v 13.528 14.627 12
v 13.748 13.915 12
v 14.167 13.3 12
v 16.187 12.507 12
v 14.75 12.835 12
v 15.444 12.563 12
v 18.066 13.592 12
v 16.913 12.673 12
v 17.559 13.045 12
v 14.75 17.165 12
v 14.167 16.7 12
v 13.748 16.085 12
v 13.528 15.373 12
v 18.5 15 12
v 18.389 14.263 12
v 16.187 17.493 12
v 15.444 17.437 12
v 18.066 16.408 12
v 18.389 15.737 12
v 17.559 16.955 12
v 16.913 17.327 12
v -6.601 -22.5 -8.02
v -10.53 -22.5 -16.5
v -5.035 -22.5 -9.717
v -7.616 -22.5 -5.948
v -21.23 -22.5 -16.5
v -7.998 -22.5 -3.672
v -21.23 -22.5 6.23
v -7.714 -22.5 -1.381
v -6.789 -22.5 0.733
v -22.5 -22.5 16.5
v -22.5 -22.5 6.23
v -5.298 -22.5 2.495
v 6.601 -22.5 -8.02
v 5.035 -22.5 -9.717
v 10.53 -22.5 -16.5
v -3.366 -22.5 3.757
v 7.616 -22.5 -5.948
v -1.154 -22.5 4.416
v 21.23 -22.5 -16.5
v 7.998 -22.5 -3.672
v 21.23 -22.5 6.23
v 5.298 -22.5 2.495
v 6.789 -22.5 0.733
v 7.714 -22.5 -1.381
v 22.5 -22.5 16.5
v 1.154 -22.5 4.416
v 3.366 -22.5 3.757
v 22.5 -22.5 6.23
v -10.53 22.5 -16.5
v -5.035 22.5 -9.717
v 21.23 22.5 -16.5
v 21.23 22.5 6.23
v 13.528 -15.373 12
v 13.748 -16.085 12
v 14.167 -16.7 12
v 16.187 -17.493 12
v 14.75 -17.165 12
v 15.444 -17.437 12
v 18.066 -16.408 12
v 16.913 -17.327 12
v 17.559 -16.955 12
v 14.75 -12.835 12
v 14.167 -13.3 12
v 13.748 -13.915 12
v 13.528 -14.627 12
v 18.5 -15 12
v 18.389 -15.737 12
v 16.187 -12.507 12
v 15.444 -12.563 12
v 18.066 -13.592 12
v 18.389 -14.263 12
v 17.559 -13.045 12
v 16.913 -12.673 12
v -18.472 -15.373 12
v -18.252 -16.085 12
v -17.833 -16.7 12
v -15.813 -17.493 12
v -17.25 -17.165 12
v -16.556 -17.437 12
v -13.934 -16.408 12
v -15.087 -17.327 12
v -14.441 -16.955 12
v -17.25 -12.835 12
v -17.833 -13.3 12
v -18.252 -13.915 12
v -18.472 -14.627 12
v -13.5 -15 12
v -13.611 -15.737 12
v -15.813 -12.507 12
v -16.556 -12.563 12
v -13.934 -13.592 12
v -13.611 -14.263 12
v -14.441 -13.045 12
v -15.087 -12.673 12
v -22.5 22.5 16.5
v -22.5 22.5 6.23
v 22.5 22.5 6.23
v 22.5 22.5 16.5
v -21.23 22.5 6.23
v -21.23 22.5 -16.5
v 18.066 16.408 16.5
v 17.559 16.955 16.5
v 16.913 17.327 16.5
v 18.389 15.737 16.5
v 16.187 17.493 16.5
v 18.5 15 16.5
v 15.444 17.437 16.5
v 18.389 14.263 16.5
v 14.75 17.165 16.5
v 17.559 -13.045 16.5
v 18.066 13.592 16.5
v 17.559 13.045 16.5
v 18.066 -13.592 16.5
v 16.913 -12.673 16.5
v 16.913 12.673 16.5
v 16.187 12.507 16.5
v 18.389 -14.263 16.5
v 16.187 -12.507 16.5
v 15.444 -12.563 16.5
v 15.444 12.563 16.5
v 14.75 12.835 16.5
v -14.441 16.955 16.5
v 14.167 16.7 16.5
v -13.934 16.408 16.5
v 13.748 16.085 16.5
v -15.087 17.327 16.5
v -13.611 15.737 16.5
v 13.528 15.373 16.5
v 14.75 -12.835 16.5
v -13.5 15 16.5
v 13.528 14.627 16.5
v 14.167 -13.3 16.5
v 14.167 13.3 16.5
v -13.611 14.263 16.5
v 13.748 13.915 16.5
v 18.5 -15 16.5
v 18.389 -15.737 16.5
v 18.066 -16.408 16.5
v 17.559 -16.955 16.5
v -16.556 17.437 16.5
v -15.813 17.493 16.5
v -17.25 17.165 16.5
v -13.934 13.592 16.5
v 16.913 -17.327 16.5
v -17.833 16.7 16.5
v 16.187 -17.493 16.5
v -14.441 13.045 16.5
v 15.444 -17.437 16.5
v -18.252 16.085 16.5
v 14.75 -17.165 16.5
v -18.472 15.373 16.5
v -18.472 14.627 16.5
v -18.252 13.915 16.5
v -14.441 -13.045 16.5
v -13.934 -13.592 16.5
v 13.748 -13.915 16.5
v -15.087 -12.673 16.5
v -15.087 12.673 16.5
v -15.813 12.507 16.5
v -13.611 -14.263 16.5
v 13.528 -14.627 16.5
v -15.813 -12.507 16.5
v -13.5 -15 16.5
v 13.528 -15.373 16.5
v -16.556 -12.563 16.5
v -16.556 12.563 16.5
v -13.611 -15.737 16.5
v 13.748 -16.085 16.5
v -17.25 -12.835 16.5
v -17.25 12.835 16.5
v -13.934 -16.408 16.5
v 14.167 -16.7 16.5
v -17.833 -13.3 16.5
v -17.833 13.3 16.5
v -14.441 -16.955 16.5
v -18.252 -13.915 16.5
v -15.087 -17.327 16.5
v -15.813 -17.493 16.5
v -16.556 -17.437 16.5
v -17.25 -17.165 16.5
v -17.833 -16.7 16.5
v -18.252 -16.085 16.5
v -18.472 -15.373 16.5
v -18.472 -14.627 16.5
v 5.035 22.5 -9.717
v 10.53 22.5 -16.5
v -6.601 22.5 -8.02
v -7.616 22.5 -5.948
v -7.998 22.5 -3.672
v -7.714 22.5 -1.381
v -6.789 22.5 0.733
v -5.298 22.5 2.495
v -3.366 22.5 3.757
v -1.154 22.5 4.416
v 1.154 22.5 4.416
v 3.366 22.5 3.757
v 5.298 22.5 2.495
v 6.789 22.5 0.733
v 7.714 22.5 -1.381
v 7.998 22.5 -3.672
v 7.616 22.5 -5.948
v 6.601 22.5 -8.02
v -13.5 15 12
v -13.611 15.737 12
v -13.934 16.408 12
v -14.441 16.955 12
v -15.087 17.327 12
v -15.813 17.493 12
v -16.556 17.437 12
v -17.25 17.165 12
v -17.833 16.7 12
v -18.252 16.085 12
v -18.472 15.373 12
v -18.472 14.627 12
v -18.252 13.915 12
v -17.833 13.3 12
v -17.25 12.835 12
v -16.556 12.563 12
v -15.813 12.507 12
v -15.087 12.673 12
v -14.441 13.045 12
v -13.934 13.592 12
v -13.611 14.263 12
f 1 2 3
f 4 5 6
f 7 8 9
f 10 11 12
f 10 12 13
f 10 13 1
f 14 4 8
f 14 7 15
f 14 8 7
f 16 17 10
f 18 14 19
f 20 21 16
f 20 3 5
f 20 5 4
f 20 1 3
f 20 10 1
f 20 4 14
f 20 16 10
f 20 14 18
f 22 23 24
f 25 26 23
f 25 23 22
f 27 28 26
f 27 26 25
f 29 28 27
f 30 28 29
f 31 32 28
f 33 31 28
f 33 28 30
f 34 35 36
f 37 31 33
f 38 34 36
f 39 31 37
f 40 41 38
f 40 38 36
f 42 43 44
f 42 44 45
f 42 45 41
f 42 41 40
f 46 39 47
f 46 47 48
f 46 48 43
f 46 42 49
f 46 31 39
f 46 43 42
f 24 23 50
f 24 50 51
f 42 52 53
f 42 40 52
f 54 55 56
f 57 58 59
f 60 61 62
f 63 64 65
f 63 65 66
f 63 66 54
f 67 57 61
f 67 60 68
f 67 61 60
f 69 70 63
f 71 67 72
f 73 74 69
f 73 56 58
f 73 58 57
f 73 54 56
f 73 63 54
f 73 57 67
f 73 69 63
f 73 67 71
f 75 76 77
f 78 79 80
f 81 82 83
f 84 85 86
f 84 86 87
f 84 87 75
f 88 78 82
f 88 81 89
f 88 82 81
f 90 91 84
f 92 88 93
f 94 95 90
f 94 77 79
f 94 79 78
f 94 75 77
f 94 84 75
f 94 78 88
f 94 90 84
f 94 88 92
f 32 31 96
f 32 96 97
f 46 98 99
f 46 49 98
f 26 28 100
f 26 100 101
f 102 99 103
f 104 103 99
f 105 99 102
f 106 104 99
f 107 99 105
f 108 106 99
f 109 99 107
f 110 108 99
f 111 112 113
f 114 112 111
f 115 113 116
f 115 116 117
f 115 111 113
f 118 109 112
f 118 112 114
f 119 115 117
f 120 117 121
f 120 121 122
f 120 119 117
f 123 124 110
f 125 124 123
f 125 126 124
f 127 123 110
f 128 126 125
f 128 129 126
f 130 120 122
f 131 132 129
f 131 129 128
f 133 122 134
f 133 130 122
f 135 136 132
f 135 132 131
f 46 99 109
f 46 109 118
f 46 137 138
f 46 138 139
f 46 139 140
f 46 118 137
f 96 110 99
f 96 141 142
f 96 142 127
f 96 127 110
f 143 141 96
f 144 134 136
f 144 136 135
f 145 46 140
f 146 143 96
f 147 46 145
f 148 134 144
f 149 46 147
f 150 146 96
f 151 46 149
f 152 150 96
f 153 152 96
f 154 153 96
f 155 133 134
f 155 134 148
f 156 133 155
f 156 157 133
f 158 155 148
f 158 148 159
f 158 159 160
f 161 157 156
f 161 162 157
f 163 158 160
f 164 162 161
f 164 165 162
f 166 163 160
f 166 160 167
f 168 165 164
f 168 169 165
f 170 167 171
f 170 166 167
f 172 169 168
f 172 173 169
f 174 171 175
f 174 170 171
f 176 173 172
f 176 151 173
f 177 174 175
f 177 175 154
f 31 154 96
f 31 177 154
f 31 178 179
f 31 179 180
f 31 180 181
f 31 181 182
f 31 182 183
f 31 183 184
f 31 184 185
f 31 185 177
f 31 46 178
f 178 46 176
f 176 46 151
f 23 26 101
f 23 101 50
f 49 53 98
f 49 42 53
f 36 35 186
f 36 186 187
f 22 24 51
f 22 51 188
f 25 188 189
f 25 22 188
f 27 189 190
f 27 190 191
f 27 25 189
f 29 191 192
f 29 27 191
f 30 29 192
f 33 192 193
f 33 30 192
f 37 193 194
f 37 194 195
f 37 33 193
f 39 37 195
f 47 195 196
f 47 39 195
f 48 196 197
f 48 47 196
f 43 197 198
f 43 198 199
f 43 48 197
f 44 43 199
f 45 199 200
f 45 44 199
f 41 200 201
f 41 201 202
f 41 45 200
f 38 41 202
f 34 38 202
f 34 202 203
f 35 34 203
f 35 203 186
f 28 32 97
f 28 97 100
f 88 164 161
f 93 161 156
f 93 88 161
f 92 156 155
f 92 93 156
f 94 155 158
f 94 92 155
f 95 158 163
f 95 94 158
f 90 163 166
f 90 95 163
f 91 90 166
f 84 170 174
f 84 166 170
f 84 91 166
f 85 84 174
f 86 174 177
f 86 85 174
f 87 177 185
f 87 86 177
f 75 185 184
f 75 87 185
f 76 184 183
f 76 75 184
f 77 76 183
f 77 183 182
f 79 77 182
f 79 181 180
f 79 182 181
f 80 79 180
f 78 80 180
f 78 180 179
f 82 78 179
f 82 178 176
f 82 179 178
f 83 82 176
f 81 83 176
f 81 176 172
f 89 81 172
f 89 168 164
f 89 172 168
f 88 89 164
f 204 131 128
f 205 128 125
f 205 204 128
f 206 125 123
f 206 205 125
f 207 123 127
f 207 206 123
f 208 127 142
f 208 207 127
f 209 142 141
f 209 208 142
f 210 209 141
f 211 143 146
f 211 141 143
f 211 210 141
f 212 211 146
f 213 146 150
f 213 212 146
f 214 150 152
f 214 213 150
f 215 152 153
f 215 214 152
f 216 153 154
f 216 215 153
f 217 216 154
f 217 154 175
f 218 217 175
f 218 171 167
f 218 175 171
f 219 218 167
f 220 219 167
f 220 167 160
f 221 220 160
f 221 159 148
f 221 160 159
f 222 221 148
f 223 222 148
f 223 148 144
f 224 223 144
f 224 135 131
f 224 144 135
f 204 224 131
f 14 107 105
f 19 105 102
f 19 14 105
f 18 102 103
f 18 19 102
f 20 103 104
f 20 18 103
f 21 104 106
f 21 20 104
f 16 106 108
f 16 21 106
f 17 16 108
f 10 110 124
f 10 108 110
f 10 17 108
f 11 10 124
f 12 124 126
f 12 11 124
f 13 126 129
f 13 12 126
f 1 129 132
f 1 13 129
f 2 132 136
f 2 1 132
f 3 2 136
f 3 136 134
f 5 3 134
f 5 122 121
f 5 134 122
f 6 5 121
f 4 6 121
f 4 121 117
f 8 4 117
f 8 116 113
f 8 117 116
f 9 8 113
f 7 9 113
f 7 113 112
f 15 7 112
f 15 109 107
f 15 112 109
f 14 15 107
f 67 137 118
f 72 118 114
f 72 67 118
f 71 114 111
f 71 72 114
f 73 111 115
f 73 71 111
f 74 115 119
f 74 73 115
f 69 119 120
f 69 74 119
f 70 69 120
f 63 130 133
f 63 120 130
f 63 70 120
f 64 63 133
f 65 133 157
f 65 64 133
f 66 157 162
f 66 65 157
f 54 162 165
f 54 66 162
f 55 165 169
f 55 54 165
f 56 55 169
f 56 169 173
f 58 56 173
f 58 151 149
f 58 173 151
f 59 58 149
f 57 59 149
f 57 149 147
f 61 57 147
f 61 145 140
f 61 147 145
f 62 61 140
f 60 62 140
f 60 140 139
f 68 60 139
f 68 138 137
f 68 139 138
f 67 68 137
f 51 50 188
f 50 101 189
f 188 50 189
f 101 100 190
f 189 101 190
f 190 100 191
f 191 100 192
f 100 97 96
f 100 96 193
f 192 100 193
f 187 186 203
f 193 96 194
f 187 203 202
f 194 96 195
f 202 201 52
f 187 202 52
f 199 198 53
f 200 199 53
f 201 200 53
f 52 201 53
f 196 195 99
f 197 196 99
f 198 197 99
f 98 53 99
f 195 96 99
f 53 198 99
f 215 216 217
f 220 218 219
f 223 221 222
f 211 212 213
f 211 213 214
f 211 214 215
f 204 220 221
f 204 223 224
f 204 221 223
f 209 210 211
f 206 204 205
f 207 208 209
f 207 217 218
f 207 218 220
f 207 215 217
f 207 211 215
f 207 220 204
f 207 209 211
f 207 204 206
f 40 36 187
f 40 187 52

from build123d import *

# Parameters (mm, degrees)
F1_DEPTH = 22.5
F3_START = 12
F2_R     = 2.5
F3_DEPTH = 13


with BuildPart() as f1:
    # F0 (on Front) → F1 (new body, symmetric)
    with BuildSketch(Plane.XZ):
        with BuildLine():
            Line((22.5, 6.23), (22.5, 16.5))
            Line((22.5, 16.5), (-22.5, 16.5))
            Line((-22.5, 16.5), (-22.5, 6.23))
            Line((-22.5, 6.23), (-21.23, 6.23))
            Line((-21.23, 6.23), (-21.23, -16.5))
            Line((-21.23, -16.5), (-10.53, -16.5))
            Line((-10.53, -16.5), (-5.0353739326, -9.7165110278))
            ThreePointArc((-5.0353739326, -9.7165110278), (0, 4.5), (5.0353739326, -9.7165110278))
            Line((5.0353739326, -9.7165110278), (10.53, -16.5))
            Line((10.53, -16.5), (21.23, -16.5))
            Line((21.23, -16.5), (21.23, 6.23))
            Line((21.23, 6.23), (22.5, 6.23))
        make_face()
    extrude(amount=F1_DEPTH, both=True)

    # F2 (on Top) → F3 (cut)
    with BuildSketch(Plane.XY.offset(F3_START)):
        with Locations((-16, 15)):
            Circle(F2_R)
        with Locations((-16, -15)):
            Circle(F2_R)
        with Locations((16, 15)):
            Circle(F2_R)
        with Locations((16, -15)):
            Circle(F2_R)
    extrude(amount=F3_DEPTH, mode=Mode.SUBTRACT)


solid = f1.part
